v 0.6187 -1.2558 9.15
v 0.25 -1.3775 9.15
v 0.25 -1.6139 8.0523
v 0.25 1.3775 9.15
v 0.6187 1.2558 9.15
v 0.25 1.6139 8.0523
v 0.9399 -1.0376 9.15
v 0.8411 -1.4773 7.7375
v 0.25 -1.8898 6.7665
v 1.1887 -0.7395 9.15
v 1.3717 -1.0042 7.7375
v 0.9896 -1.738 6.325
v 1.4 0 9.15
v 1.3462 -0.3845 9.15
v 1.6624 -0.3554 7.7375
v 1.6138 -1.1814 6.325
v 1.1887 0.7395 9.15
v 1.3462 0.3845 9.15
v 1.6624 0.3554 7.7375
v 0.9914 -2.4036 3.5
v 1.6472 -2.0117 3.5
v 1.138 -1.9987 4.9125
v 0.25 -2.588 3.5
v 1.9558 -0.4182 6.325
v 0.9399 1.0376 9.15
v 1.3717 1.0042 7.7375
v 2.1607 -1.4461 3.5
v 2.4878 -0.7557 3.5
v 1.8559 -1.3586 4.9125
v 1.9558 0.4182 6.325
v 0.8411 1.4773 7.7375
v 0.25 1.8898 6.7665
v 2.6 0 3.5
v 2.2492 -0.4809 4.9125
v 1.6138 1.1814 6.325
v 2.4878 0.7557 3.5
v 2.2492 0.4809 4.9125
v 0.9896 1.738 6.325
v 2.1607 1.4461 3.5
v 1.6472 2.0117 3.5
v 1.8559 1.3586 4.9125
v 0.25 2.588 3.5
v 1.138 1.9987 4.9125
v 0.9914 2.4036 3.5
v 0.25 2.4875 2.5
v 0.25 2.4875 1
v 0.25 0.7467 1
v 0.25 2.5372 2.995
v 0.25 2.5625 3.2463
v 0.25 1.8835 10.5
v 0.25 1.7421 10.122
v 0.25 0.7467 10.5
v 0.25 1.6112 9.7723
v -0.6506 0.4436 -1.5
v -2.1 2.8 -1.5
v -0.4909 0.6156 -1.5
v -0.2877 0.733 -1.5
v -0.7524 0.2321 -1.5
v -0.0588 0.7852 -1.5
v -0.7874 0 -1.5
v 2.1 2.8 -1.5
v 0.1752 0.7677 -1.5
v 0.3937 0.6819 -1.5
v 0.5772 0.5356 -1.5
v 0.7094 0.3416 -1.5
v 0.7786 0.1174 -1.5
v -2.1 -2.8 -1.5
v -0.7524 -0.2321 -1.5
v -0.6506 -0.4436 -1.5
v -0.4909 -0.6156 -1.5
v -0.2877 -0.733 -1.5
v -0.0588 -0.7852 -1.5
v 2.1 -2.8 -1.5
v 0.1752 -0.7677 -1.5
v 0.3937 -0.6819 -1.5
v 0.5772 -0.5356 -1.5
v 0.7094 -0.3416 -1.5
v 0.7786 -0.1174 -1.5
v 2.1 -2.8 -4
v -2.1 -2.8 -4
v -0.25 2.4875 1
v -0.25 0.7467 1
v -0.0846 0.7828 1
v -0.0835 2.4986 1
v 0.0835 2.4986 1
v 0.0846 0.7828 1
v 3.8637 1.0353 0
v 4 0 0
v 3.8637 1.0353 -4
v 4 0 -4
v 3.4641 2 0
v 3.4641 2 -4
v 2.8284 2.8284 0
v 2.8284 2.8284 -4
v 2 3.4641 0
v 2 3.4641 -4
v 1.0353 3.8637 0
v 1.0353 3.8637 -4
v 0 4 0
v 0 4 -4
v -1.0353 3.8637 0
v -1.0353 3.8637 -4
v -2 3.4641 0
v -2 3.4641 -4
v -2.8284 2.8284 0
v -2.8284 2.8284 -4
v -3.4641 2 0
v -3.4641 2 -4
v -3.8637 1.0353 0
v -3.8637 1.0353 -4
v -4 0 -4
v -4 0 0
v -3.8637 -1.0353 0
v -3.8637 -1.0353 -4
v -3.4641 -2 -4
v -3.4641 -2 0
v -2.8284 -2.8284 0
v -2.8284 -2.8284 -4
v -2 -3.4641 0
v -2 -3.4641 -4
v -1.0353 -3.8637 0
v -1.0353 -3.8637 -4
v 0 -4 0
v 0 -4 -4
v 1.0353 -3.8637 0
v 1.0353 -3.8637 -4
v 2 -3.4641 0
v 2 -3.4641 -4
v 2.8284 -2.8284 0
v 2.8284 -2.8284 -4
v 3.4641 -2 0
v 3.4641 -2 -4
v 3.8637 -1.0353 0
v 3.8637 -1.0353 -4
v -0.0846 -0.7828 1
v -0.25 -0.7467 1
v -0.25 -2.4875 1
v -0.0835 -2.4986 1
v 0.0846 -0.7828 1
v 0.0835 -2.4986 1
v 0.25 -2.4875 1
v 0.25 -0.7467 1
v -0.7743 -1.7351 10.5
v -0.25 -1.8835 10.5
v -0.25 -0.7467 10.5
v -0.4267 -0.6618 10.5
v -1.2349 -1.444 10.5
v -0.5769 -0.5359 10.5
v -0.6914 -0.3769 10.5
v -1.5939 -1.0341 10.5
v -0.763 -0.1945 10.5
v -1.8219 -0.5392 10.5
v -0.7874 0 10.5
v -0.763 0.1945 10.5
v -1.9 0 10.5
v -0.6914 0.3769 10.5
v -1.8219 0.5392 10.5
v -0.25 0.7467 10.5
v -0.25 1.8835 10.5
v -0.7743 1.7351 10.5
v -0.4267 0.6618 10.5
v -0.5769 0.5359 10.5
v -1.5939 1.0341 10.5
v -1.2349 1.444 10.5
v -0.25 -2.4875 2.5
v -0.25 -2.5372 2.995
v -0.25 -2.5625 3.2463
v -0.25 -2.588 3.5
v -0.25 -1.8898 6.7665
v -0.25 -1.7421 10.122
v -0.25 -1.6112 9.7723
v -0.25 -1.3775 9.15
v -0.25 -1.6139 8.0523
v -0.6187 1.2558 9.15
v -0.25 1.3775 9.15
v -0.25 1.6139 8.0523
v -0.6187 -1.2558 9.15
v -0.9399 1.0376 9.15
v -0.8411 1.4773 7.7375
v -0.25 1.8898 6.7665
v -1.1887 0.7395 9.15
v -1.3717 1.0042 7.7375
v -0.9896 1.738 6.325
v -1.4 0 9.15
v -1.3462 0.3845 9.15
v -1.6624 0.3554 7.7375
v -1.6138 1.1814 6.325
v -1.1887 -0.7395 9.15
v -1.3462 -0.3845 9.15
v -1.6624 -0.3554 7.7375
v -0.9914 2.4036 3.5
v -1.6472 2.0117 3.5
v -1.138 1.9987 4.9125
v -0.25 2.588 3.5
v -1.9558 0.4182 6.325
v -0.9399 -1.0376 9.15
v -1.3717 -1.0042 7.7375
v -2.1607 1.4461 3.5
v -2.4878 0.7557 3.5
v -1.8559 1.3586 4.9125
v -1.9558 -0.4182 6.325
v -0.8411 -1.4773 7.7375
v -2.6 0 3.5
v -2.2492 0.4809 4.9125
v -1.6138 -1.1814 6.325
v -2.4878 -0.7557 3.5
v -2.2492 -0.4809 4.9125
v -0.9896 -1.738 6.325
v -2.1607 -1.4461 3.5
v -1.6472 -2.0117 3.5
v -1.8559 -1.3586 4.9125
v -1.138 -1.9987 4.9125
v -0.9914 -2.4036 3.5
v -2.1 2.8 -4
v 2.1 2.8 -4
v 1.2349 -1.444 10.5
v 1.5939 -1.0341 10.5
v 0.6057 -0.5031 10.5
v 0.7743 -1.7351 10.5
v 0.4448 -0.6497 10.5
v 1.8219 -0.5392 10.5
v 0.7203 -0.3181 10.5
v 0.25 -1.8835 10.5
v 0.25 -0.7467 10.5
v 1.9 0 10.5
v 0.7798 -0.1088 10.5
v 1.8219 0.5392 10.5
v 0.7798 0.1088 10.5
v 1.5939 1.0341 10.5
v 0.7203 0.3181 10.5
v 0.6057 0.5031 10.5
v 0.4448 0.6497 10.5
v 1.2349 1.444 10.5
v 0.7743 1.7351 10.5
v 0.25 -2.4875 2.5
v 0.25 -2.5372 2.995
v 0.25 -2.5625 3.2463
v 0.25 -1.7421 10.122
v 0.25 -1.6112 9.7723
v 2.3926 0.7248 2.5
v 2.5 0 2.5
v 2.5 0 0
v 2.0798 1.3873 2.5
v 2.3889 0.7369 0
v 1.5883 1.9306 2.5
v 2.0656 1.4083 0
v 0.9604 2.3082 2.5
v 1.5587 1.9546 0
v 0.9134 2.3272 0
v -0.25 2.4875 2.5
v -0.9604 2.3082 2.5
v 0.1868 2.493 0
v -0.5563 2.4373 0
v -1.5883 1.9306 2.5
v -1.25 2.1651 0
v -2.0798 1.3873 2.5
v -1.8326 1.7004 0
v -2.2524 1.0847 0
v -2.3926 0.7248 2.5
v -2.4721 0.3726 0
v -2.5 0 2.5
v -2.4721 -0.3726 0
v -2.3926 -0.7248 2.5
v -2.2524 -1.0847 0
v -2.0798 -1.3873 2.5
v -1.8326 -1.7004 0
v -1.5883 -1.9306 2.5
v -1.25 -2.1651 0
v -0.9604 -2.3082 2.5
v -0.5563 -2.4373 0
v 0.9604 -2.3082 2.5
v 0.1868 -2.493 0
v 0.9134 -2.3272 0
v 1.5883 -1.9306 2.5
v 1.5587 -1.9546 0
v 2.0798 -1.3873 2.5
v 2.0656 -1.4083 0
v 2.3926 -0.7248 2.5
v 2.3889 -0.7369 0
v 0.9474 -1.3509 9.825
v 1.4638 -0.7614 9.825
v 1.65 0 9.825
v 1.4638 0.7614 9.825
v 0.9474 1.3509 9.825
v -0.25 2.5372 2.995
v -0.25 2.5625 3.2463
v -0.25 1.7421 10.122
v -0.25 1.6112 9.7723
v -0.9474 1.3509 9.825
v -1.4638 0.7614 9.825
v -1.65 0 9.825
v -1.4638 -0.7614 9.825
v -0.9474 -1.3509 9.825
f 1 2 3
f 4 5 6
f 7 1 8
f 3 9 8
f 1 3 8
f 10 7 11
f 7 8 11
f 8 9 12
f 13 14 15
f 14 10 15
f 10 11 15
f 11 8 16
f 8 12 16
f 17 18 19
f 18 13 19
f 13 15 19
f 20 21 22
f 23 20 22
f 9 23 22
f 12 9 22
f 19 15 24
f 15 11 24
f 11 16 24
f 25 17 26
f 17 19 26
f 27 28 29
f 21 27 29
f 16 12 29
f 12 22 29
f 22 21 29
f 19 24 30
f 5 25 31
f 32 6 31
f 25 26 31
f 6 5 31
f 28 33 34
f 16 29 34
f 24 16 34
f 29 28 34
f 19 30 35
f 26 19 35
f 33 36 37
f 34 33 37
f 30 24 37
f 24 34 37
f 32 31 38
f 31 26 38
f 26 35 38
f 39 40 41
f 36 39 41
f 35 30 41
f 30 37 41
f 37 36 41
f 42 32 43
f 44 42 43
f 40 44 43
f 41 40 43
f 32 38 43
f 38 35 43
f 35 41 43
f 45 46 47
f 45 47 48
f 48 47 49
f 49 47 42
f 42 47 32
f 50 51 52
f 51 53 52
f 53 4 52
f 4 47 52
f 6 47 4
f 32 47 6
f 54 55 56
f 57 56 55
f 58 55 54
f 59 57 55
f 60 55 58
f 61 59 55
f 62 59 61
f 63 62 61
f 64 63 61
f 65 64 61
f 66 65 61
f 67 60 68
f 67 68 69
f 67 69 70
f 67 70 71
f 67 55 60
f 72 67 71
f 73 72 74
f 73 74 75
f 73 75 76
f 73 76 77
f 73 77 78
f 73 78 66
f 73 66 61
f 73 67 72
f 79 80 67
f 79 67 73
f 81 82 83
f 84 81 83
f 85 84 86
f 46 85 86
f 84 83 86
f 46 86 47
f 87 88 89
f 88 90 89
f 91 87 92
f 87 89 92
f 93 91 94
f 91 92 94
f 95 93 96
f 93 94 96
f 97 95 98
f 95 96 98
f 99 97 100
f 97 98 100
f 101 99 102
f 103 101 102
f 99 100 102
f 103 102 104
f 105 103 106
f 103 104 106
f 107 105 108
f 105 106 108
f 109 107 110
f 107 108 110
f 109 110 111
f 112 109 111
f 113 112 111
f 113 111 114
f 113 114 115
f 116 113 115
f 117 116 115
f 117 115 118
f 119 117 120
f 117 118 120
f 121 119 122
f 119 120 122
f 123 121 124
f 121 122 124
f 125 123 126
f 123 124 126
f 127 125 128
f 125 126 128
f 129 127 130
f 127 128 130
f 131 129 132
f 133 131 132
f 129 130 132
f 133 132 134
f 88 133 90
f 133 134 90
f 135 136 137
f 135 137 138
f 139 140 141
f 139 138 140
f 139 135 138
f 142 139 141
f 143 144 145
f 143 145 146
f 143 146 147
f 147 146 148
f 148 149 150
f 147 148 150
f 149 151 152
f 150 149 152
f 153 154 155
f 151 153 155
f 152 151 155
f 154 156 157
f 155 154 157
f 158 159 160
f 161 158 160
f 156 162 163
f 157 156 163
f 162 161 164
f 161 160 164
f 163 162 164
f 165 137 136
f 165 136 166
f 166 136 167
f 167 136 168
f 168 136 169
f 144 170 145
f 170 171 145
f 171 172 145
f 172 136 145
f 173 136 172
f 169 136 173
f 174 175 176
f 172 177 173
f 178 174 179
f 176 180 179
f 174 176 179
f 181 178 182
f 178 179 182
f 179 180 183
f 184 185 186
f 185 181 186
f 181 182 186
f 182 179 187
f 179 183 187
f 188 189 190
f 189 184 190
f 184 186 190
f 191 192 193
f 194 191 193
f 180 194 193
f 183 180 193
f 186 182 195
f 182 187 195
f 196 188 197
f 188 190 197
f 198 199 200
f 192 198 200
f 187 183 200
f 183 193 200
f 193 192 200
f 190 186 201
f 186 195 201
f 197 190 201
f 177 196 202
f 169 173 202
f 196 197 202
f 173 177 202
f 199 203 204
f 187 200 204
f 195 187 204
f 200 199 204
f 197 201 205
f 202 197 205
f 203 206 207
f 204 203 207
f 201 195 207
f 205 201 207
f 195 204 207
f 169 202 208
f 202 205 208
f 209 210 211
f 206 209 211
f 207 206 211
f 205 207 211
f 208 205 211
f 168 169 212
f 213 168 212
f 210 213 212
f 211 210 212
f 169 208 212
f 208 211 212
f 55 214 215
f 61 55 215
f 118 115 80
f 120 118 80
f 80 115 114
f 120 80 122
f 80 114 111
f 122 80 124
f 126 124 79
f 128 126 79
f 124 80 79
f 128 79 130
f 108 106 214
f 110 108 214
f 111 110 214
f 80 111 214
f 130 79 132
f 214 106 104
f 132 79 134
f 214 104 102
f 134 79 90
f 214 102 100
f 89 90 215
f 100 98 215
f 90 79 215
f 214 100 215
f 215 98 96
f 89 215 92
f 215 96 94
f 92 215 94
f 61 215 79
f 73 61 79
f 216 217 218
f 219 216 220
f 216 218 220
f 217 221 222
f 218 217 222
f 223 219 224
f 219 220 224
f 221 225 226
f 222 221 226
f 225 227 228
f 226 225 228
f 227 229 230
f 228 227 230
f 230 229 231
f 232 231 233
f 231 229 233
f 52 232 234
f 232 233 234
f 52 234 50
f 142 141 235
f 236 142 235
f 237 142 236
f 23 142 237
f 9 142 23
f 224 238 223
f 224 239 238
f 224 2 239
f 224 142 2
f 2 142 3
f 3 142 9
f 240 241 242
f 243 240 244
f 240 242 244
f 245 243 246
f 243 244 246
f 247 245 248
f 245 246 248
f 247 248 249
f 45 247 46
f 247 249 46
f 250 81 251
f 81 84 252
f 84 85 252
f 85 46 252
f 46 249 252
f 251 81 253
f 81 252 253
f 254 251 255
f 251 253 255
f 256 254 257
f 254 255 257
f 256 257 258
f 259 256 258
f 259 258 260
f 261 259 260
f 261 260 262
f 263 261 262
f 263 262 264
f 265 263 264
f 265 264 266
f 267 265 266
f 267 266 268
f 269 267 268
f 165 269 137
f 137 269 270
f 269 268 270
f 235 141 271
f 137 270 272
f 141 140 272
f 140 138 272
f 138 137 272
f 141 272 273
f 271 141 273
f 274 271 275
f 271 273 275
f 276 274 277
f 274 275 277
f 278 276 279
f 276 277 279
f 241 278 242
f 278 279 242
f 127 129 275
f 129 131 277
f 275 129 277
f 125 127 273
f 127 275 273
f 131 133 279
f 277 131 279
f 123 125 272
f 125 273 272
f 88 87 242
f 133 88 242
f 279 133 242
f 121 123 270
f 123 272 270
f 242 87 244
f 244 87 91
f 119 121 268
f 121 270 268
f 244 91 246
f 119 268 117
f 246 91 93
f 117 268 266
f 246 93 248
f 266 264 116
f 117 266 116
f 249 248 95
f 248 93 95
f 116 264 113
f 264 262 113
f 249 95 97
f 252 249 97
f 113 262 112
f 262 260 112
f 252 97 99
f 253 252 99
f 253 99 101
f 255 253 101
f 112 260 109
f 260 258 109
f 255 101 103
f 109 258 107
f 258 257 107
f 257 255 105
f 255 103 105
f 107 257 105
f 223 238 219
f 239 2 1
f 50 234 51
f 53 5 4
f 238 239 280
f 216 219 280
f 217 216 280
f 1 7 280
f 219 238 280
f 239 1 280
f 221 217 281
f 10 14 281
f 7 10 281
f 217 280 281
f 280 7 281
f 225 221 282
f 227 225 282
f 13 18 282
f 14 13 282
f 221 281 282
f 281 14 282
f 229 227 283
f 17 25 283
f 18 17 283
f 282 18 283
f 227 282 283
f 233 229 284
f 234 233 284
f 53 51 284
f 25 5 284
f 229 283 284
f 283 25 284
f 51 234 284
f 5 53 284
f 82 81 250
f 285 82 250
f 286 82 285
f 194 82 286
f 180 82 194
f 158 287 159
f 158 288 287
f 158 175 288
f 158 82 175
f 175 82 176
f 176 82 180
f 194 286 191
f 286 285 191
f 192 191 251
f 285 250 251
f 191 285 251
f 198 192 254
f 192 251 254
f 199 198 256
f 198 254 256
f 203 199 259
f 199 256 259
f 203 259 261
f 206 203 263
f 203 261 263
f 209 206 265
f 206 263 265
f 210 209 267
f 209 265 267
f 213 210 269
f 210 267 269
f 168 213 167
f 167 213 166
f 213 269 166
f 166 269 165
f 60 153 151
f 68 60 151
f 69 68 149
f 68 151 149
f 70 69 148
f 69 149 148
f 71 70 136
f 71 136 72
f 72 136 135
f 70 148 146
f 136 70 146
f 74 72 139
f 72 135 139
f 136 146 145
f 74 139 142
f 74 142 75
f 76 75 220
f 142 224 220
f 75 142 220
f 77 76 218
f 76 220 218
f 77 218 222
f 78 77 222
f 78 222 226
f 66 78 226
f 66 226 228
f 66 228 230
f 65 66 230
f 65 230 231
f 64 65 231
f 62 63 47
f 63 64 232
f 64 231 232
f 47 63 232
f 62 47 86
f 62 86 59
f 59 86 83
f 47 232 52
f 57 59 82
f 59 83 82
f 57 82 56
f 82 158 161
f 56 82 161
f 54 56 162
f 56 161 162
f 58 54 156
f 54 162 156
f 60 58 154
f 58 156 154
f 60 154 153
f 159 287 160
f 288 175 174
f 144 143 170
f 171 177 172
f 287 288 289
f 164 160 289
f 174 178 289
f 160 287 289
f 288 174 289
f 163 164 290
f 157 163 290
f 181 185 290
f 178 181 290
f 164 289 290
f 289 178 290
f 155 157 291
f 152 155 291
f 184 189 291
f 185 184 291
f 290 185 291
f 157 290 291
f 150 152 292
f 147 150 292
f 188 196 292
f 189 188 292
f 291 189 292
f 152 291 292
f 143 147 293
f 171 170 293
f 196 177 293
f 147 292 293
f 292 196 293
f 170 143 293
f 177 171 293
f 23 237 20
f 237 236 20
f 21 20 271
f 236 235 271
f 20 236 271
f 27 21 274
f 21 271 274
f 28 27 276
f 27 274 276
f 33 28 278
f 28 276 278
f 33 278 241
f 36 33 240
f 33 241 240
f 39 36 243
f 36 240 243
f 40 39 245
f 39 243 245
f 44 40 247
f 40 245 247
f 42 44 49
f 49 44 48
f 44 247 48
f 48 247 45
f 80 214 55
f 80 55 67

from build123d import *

# Parameters (mm, degrees)
SKETCH001_W          = 4.2
SKETCH001_H          = 5.6
POCKET_DEPTH         = 2.5
SKETCH002_R          = 0.7874
POCKET001_DEPTH      = 14.501
SKETCH004_W          = 0.5
SKETCH004_H          = 11.942059
SKETCH004_H_2        = 6.122161
POCKET003_DEPTH      = 5
POCKET003_DEPTH_BACK = -5


with BuildPart() as part:
    # Sketch → Revolution (revolve)
    with BuildSketch(Plane.XZ):
        Polygon((2.5, 0), (4, 0), (4, -4), (0, -4), (0, 0), (0, 10.5), (1.9, 10.5), (1.4, 9.15), (2.6, 3.5), (2.5, 2.5), align=None)
    revolve(axis=Axis((0, 0, 0), (0, 0, 1)))

    # Sketch001 (on Face5 of Revolution) → Pocket (cut)
    with BuildSketch(Plane(origin=(0, 0, -4), x_dir=(1, 0, 0), z_dir=(0, 0, -1))):
        Rectangle(SKETCH001_W, SKETCH001_H)
    extrude(amount=-POCKET_DEPTH, mode=Mode.SUBTRACT)

    # Sketch002 (on Face6 of Pocket) → Pocket001 (cut, through all)
    with BuildSketch(Plane(origin=(0, 0, 10.5), x_dir=(-1, 0, 0), z_dir=(0, 0, 1))):
        Circle(SKETCH002_R)
    extrude(amount=-POCKET001_DEPTH, mode=Mode.SUBTRACT)

    # Sketch004 → Pocket003 (cut, two sides)
    with BuildSketch(Plane.XZ) as pocket003_sk:
        with Locations((0, 6.971029)):
            Rectangle(SKETCH004_W, SKETCH004_H)
        with Locations((0, -13.475635)):
            Rectangle(SKETCH004_W, SKETCH004_H_2)
    extrude(amount=-POCKET003_DEPTH, mode=Mode.SUBTRACT)
    extrude(pocket003_sk.sketch, amount=-POCKET003_DEPTH_BACK, mode=Mode.SUBTRACT)


solid = part.part
